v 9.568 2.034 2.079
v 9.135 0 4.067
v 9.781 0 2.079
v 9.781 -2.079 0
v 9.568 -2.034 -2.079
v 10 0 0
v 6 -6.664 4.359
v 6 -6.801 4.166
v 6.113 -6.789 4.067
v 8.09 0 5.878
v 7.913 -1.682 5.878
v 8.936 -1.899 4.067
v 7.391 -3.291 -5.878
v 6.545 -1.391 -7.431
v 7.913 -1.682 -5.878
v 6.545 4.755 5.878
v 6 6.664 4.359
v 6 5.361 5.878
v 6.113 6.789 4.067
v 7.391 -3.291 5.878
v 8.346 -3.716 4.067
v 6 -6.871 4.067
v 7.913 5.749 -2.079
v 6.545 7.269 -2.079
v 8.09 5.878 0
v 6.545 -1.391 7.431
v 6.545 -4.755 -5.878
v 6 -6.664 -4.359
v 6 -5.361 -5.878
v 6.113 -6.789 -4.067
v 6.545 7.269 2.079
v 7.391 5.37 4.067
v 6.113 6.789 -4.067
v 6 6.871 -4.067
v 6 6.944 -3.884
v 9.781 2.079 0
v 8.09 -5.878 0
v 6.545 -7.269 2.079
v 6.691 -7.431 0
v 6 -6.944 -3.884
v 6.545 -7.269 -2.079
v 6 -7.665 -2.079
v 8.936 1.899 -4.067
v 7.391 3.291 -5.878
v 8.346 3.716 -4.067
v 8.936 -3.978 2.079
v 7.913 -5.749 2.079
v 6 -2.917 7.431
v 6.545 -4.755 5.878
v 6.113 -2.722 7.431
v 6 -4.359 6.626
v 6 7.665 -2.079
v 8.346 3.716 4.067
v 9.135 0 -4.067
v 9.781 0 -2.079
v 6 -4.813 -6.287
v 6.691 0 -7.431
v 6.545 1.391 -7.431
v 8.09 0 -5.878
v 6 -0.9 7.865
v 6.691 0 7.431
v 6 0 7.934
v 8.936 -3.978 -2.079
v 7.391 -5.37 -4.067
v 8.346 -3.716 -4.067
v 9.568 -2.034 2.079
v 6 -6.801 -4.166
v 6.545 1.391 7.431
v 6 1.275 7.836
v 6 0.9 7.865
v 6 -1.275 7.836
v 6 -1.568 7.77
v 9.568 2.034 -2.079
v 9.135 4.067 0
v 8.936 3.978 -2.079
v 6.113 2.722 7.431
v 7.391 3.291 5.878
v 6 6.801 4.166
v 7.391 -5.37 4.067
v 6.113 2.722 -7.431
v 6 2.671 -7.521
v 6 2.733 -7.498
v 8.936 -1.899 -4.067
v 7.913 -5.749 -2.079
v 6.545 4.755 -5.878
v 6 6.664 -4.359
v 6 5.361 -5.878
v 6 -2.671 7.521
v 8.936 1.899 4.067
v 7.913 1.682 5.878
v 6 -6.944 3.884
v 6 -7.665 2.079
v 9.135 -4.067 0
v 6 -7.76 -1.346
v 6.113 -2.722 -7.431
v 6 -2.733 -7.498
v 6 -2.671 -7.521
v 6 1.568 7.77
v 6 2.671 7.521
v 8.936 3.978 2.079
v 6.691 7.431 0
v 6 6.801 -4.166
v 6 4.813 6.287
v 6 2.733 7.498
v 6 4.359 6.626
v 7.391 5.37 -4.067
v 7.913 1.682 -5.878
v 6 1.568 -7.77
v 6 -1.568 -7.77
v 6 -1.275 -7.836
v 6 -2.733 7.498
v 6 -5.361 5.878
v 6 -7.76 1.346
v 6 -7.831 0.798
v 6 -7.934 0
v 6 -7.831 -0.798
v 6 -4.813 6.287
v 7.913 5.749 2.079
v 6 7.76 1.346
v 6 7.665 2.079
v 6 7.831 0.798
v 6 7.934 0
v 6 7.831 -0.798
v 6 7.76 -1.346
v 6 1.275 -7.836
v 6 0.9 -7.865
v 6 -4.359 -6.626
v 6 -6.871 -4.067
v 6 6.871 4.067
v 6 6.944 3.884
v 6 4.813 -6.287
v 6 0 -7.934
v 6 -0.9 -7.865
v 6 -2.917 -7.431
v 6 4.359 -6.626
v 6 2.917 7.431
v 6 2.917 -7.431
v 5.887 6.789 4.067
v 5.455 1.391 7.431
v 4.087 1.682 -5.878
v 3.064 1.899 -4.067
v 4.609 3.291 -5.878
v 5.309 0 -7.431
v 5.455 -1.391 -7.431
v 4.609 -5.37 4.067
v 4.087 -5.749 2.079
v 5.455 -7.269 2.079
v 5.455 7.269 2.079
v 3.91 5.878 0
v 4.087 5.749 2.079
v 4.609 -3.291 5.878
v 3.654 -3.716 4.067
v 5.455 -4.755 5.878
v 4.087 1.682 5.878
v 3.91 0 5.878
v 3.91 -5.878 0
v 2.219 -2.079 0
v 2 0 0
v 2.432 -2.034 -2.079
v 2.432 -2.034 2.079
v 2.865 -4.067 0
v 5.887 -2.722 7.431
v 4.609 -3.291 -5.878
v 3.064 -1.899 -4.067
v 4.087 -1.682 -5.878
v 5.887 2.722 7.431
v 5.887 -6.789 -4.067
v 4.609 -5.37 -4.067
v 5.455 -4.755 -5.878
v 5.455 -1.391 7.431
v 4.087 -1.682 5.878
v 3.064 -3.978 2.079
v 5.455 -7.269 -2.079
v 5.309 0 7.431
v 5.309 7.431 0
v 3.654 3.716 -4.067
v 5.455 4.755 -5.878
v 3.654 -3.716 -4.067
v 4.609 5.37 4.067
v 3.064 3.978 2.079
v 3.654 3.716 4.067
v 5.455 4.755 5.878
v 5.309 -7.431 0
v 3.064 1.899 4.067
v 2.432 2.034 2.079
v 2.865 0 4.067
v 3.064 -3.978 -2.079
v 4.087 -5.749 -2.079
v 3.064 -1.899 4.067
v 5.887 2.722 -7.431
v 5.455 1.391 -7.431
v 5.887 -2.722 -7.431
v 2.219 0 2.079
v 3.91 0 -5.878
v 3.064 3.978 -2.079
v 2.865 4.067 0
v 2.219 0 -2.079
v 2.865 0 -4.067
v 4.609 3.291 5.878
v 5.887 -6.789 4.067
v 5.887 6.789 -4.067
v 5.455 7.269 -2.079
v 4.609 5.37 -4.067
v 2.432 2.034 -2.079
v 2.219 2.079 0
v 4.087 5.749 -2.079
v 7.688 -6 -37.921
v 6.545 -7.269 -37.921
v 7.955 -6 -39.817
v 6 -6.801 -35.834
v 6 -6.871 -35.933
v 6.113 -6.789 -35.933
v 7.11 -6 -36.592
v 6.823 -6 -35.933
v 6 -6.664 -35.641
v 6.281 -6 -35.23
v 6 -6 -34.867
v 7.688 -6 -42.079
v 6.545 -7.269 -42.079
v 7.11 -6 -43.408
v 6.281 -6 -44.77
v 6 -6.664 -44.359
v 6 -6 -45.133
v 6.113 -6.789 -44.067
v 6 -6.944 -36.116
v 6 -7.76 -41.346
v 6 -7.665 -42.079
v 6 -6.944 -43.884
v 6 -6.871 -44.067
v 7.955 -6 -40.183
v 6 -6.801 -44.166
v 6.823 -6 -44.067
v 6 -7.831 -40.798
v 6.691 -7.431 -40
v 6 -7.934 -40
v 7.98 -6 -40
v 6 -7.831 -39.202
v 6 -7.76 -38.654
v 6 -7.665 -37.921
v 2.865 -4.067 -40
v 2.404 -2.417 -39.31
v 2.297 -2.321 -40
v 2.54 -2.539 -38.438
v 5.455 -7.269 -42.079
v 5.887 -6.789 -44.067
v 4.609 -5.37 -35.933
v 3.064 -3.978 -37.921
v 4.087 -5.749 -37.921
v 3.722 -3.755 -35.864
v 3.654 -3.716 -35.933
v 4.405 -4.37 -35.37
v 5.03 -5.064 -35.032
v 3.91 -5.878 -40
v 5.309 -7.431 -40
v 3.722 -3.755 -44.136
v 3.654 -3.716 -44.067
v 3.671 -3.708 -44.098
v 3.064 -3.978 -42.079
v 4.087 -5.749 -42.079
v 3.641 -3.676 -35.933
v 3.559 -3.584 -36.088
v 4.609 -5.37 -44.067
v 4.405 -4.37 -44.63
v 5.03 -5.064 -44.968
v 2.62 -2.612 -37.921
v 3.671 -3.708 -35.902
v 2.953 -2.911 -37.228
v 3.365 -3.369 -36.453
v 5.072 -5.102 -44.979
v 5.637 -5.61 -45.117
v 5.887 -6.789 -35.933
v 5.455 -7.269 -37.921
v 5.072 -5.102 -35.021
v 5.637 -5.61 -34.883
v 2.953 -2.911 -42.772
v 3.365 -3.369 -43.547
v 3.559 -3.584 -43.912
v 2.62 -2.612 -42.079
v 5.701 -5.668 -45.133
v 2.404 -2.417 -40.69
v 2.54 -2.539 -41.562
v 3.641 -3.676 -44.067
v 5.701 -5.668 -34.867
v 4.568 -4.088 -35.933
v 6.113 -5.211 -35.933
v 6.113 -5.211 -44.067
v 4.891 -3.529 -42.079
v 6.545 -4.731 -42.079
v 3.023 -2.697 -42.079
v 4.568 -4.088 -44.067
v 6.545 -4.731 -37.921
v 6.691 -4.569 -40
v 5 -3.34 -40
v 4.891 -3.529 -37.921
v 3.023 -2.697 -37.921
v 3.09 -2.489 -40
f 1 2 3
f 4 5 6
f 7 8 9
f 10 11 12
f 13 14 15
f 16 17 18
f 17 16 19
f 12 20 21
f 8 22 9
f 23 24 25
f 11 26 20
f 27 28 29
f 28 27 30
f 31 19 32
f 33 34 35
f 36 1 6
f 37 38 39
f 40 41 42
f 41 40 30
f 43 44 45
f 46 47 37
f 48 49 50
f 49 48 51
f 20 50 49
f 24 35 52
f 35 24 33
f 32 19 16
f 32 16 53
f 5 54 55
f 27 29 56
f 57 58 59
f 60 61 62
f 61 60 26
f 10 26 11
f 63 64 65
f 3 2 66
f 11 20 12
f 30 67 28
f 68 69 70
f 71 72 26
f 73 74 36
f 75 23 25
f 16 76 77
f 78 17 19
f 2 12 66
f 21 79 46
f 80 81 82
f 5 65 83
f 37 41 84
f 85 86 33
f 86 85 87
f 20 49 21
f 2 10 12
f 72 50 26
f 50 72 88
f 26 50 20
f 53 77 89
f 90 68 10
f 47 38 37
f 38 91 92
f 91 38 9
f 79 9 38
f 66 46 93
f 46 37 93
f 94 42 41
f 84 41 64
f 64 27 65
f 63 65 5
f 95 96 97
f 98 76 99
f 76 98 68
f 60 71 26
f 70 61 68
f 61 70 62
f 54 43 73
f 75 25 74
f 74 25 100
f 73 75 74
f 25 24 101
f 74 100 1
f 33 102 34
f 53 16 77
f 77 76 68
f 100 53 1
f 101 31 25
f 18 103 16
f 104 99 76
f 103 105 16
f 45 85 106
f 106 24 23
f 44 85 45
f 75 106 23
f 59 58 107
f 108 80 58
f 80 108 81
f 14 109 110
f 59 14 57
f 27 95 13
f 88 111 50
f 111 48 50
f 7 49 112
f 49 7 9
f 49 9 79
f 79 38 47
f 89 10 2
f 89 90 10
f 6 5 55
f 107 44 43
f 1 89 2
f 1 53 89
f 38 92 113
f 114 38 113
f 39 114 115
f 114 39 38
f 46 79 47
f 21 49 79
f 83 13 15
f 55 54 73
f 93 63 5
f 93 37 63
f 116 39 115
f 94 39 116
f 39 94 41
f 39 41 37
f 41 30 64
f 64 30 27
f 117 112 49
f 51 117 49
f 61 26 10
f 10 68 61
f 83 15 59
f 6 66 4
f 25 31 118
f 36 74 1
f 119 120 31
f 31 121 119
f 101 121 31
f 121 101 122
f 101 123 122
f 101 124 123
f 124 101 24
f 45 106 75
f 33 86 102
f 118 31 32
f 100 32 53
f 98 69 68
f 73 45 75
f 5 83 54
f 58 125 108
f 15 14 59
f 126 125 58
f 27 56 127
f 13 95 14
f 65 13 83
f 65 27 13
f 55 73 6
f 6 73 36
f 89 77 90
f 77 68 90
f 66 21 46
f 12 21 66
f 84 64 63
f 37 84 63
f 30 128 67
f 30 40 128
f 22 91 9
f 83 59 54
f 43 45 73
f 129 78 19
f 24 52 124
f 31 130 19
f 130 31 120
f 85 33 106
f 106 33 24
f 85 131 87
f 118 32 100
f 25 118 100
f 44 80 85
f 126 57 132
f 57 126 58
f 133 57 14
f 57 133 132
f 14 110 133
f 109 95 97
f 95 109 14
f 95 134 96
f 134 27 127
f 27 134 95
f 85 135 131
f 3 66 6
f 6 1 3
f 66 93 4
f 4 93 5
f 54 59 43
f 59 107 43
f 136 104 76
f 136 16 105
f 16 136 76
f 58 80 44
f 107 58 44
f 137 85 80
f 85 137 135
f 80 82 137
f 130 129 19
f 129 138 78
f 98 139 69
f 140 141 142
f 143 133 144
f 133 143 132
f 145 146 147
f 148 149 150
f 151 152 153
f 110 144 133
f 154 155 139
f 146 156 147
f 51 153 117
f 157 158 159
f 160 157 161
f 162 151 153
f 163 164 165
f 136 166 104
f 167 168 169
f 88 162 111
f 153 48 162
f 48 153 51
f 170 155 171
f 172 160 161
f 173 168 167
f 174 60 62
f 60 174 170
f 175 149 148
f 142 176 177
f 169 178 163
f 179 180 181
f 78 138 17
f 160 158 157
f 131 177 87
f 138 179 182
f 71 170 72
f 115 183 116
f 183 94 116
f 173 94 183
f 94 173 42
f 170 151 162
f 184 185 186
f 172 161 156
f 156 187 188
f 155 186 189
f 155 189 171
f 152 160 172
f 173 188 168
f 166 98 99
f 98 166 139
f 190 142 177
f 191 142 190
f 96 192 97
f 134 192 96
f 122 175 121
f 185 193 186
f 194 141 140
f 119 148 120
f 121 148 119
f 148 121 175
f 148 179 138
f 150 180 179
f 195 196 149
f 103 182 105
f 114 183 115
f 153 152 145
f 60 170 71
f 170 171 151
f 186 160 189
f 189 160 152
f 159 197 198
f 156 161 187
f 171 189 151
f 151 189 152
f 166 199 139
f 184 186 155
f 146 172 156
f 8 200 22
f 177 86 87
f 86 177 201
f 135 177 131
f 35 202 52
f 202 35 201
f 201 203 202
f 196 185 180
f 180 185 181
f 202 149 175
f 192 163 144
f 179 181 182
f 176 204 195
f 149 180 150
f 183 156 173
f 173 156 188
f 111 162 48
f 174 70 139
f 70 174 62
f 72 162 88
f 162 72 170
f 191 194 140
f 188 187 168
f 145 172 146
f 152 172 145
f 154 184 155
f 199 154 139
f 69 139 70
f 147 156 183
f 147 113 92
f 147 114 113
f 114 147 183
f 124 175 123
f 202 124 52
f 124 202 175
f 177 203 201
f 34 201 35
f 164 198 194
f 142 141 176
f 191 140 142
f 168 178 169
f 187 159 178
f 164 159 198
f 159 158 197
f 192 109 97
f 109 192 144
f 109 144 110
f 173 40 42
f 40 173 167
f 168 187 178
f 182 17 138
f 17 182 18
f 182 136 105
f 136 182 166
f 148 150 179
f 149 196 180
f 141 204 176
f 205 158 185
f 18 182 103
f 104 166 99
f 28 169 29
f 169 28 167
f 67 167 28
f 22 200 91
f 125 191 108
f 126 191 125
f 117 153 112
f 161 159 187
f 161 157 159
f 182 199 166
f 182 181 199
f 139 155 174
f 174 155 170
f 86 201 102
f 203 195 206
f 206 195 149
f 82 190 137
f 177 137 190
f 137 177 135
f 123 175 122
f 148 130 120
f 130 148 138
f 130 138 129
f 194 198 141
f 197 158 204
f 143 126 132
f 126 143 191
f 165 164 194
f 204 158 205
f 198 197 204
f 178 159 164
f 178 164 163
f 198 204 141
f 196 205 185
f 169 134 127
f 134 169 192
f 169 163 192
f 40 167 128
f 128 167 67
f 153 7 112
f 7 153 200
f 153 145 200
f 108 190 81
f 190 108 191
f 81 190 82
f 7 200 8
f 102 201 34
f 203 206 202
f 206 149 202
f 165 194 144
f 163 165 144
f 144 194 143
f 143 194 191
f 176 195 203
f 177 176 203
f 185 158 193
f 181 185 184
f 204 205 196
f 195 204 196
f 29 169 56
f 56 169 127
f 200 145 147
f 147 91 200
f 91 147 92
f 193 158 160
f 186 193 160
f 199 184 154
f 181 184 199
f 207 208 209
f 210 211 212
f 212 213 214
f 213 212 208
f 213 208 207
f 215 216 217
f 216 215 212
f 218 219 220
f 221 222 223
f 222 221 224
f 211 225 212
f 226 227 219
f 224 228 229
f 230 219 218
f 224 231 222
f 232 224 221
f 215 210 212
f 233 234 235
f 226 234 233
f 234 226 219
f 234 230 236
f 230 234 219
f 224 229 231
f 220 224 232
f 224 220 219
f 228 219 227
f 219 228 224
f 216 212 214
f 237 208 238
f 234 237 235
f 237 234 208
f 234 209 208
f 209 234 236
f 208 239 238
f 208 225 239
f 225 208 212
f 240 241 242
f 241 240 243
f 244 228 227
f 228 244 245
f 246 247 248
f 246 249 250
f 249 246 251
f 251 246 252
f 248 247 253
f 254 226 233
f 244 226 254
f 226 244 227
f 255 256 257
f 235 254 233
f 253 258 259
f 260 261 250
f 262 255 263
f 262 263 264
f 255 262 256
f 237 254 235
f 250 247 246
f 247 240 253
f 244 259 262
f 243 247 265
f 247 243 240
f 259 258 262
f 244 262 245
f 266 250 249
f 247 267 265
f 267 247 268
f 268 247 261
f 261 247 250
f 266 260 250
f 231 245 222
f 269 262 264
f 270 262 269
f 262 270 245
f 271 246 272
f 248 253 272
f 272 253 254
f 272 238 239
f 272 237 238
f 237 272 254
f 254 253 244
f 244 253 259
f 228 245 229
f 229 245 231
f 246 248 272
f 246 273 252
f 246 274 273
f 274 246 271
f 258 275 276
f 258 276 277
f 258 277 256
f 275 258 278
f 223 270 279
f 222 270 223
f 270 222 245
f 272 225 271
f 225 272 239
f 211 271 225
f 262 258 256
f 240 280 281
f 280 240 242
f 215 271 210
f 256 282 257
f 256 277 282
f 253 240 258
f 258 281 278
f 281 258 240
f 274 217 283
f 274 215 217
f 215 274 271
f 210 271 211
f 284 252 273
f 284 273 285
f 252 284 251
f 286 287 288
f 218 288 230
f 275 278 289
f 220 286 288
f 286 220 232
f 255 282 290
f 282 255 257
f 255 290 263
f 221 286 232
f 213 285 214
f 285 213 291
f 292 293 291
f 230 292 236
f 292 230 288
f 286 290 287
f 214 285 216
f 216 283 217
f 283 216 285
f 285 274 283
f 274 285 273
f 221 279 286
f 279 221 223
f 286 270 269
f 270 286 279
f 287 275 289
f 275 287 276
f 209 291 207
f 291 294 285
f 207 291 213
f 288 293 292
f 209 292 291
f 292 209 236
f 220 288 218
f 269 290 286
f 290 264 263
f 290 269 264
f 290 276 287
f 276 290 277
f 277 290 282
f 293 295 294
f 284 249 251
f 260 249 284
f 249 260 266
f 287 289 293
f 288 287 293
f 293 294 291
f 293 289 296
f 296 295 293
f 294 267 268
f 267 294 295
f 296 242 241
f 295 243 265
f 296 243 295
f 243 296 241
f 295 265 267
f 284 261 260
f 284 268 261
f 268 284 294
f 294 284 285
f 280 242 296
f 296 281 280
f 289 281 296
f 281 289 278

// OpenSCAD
//intersection of two spheres
intersection() {
    sphere(r=10);
    translate([12,0,0])
        sphere(r=10);
}

//intersection of three spheres
translate([0,0,-40])
intersection() {
    sphere(r=10);
    translate([12,0,0])
        sphere(r=10);
    translate([0,-12,0])
        sphere(r=10);
}
